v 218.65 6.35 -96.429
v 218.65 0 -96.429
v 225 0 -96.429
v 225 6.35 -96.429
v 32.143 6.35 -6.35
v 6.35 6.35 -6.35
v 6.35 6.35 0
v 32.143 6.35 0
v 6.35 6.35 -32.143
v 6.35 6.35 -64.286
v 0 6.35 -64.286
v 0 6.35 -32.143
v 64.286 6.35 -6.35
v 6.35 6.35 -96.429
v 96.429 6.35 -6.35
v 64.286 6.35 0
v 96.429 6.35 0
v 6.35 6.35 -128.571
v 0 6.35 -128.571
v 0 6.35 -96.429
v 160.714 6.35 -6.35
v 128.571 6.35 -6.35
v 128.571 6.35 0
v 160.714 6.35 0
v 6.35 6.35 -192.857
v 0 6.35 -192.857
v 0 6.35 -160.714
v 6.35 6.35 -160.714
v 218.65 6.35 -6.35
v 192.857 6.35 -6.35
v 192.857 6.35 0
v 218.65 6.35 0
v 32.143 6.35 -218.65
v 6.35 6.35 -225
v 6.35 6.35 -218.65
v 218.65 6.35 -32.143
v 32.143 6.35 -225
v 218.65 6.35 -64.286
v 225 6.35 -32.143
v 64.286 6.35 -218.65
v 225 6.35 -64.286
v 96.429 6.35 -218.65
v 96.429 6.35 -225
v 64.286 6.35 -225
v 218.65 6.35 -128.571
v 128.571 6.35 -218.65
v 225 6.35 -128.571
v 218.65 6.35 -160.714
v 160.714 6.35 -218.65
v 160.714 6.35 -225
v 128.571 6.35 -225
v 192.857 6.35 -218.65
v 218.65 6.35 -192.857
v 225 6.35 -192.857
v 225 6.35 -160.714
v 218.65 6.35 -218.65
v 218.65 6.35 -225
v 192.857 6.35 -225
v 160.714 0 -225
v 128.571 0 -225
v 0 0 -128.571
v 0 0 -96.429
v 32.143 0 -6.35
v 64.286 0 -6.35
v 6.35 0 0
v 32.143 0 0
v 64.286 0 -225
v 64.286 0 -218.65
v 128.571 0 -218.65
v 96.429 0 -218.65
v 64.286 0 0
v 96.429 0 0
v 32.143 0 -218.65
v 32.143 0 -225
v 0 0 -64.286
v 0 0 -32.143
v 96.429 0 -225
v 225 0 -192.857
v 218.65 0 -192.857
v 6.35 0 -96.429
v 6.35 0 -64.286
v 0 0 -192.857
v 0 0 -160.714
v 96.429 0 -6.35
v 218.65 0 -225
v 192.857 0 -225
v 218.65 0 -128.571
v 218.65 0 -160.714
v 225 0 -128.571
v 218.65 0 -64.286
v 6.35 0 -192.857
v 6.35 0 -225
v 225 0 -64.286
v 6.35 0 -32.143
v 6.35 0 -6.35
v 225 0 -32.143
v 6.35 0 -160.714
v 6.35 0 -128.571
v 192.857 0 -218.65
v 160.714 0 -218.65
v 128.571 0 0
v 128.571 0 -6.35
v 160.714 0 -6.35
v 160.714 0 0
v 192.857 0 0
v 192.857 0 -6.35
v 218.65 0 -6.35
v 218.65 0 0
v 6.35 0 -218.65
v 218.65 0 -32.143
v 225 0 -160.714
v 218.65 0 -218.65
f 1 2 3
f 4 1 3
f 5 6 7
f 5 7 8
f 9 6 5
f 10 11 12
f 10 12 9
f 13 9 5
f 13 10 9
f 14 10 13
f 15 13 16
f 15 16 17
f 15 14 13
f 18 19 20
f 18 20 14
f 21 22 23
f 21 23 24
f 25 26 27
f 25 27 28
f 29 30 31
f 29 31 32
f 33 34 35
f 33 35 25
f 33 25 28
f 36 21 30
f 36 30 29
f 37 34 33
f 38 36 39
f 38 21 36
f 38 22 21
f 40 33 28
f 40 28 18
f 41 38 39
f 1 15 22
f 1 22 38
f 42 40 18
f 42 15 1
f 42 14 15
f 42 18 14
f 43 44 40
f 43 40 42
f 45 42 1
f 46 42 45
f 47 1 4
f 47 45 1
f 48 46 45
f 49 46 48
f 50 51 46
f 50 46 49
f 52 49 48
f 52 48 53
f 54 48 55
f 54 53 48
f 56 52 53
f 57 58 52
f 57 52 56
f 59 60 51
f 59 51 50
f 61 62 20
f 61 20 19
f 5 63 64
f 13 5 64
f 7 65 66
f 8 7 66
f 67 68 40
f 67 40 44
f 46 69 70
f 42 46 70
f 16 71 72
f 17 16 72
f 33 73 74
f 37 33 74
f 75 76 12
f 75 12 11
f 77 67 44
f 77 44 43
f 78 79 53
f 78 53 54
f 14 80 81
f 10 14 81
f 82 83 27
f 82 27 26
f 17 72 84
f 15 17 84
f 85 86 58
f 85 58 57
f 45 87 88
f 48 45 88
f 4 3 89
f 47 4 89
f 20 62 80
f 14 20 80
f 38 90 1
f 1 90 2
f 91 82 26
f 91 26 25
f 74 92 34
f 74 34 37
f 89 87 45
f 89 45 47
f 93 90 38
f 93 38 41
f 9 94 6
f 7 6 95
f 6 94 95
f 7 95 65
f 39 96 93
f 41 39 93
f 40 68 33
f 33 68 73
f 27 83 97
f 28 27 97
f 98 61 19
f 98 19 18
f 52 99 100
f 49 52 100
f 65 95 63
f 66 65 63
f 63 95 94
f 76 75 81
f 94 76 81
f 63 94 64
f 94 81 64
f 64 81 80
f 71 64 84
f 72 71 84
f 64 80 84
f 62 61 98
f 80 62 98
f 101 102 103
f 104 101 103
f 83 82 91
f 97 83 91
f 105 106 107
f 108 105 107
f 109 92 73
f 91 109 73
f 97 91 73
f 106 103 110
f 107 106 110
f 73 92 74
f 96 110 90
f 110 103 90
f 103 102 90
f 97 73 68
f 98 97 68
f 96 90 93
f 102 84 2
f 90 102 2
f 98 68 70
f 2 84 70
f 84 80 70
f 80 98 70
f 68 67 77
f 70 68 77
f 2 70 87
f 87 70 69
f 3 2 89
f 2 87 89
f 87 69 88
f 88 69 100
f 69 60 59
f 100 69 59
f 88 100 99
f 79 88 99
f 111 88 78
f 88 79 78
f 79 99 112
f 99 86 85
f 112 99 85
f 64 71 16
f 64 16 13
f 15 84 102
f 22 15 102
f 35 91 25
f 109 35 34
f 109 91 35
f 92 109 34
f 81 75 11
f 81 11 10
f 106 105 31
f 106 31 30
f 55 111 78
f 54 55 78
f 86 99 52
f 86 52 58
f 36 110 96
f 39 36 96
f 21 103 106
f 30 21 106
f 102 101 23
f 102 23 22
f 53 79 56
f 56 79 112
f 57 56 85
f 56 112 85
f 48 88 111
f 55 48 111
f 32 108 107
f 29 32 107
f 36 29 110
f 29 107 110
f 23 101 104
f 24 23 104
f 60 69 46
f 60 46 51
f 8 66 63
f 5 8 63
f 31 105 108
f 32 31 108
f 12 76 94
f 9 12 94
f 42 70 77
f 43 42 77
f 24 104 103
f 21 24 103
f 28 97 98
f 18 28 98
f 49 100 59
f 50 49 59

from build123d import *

# Parameters (mm, degrees)
SKETCH1_W           = 6.35
SKETCH1_H           = 32.142857142
SKETCH1_H_2         = 32.142857143
SKETCH1_W_2         = 25.792857143
SKETCH1_H_3         = 6.35
SKETCH1_W_3         = 32.142857143
BOSS_EXTRUDE1_DEPTH = 6.35


with BuildPart() as part:
    # Sketch1 → Boss-Extrude1 (new body)
    with BuildSketch(Plane(origin=(0, 0, 0), x_dir=(1, 0, 0), z_dir=(0, 1, 0))):
        Polygon((6.35, 6.35), (32.142857143, 6.35), (64.285714286, 6.35), (96.428571429, 6.35), (128.571428571, 6.35), (160.714285714, 6.35), (192.857142857, 6.35), (218.65, 6.35), (218.65, 32.142857143), (218.65, 64.285714286), (218.65, 96.428571429), (218.65, 128.571428571), (218.65, 160.714285714), (218.65, 192.857142857), (218.65, 218.65), (192.857142857, 218.65), (160.714285714, 218.65), (128.571428571, 218.65), (96.428571429, 218.65), (64.285714286, 218.65), (32.142857143, 218.65), (6.35, 218.65), (6.35, 192.857142857), (6.35, 160.714285714), (6.35, 128.571428571), (6.35, 96.428571429), (6.35, 64.285714286), (6.35, 32.142857143), align=None)
        with Locations((3.175, 112.5)):
            Rectangle(SKETCH1_W, SKETCH1_H)
        with Locations((3.175, 48.214285715)):
            Rectangle(SKETCH1_W, SKETCH1_H_2)
        with Locations((3.175, 176.785714286)):
            Rectangle(SKETCH1_W, SKETCH1_H_2)
        with Locations((19.246428572, 3.175)):
            Rectangle(SKETCH1_W_2, SKETCH1_H_3)
        with Locations((80.357142858, 3.175)):
            Rectangle(SKETCH1_W_3, SKETCH1_H_3)
        with Locations((144.642857143, 3.175)):
            Rectangle(SKETCH1_W_3, SKETCH1_H_3)
        with Locations((205.753571429, 3.175)):
            Rectangle(SKETCH1_W_2, SKETCH1_H_3)
        with Locations((221.825, 48.214285715)):
            Rectangle(SKETCH1_W, SKETCH1_H_2)
        with Locations((221.825, 112.5)):
            Rectangle(SKETCH1_W, SKETCH1_H)
        with Locations((221.825, 176.785714286)):
            Rectangle(SKETCH1_W, SKETCH1_H_2)
        with Locations((205.753571429, 221.825)):
            Rectangle(SKETCH1_W_2, SKETCH1_H_3)
        with Locations((144.642857143, 221.825)):
            Rectangle(SKETCH1_W_3, SKETCH1_H_3)
        with Locations((80.357142858, 221.825)):
            Rectangle(SKETCH1_W_3, SKETCH1_H_3)
        with Locations((19.246428572, 221.825)):
            Rectangle(SKETCH1_W_2, SKETCH1_H_3)
    extrude(amount=BOSS_EXTRUDE1_DEPTH)


solid = part.part
